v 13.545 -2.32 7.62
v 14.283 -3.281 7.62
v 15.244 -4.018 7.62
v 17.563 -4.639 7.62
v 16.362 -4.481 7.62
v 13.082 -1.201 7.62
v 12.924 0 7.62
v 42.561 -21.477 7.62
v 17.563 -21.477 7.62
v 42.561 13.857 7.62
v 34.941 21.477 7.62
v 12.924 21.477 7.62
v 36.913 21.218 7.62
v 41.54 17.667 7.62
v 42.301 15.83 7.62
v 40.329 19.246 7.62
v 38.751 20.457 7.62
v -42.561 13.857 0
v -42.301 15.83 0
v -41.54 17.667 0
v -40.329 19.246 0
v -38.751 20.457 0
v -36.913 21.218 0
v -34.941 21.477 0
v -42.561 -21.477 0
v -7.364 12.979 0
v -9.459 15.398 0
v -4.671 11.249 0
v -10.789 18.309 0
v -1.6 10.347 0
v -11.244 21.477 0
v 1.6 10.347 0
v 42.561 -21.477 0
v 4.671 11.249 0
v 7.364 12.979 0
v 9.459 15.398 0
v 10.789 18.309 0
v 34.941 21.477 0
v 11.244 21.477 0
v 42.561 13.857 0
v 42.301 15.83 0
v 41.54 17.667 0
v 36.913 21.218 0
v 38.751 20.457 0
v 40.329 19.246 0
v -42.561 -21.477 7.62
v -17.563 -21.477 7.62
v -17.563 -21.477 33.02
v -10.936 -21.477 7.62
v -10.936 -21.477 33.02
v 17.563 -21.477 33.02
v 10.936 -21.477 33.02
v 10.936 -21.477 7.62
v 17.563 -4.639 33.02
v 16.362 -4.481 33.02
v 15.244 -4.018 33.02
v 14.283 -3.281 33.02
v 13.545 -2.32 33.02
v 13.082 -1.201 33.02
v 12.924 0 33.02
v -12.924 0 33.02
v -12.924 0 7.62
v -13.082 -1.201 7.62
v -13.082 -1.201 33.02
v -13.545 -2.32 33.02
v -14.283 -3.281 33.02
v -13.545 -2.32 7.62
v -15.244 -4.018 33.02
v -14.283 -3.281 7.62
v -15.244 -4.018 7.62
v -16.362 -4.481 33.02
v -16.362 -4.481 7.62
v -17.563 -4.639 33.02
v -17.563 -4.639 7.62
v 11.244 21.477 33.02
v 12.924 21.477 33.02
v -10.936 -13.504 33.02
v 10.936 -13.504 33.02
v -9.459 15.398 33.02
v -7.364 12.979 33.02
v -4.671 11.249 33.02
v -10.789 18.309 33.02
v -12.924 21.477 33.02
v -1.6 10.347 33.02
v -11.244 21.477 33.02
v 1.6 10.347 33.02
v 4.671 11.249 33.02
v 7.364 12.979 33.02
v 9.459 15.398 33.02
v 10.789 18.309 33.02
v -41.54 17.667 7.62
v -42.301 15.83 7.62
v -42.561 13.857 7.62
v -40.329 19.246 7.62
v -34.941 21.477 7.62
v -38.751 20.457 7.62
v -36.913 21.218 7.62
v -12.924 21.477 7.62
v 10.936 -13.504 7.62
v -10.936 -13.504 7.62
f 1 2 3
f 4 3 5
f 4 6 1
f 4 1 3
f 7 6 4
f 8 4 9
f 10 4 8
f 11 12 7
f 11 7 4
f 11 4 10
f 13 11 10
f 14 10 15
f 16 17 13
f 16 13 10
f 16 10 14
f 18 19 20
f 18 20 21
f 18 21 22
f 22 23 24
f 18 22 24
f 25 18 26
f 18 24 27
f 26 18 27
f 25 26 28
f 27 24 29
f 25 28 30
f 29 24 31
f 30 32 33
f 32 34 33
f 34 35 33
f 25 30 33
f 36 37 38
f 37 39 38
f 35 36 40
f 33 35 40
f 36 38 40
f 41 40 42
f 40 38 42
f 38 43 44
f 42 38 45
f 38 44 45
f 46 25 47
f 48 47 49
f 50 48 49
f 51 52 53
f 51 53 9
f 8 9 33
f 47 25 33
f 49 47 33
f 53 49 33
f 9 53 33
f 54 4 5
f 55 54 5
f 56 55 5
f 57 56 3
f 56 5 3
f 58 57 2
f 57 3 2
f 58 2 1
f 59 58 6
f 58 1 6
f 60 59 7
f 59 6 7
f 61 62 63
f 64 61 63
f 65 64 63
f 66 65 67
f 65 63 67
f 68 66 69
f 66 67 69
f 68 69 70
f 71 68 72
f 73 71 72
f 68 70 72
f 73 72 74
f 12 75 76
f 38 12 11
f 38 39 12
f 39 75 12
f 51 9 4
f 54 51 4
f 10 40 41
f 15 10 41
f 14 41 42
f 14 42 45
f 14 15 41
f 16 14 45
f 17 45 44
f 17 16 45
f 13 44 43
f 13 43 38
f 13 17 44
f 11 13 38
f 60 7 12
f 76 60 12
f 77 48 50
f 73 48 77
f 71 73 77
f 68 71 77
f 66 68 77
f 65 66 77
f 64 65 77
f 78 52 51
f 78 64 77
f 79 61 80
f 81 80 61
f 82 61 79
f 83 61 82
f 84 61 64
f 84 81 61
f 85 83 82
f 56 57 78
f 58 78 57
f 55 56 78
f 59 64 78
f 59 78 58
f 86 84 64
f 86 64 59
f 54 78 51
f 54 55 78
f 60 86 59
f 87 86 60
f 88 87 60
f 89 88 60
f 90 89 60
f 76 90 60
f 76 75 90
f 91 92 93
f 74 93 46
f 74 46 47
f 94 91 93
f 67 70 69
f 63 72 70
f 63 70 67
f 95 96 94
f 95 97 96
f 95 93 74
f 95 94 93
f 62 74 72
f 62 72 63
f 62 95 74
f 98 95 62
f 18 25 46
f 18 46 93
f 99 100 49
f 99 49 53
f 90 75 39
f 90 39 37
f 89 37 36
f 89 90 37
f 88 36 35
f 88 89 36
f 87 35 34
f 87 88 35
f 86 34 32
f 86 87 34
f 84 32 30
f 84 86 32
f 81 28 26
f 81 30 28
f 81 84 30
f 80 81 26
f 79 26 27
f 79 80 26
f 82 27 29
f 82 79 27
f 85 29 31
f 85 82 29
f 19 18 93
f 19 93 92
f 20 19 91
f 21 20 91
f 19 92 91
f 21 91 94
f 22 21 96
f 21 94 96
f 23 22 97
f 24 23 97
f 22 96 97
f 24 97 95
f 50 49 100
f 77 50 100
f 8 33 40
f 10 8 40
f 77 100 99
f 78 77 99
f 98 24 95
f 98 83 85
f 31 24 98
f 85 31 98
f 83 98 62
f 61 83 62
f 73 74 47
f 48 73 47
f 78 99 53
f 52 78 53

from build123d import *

# Parameters (mm, degrees)
F0_W     = 85.1215273142
F0_H     = 42.9548472166
F1_DEPTH = 7.62
F2_R     = 7.62
F4_DEPTH = 25.4
F5_DEPTH = 25.4


with BuildPart() as f1:
    # F0 (on Top) → F1 (new body)
    with BuildSketch(Plane.XY):
        Rectangle(F0_W, F0_H)
    extrude(amount=F1_DEPTH)

    # F2
    f2_edges = [f1.edges().sort_by_distance(p)[0] for p in [
        (-42.560764, 21.477424, 3.81),
        (42.560764, 21.477424, 3.81),
    ]]
    fillet(f2_edges, radius=F2_R)

    # F3 (on face) → F4 (join)
    with BuildSketch(Plane.XY.offset(7.62)):
        with BuildLine():
            Line((12.9238776863, 21.4774236083), (11.2444977121, 21.4774236083))
            ThreePointArc((11.2444977121, 21.4774236083), (0, 10.2329258962), (-11.2444977121, 21.4774236083))
            Line((-11.2444977121, 21.4774236083), (-12.9238776863, 21.4774236083))
            Line((-12.9238776863, 21.4774236083), (-12.9238776863, 0))
            ThreePointArc((-12.9238776863, 0), (-14.282709623, -3.2805104906), (-17.5632201135, -4.6393424273))
            Line((-17.5632201135, -4.6393424273), (-17.5632201135, -21.4774236083))
            Line((-17.5632201135, -21.4774236083), (-10.9355887398, -21.4774236083))
            Line((-10.9355887398, -21.4774236083), (-10.9355887398, -13.5037954897))
            Line((-10.9355887398, -13.5037954897), (-3.6451956257, -13.5037954897))
            Line((-3.6451956257, -13.5037954897), (3.6451956257, -13.5037954897))
            Line((3.6451956257, -13.5037954897), (10.9355887398, -13.5037954897))
            Line((10.9355887398, -13.5037954897), (10.9355887398, -21.4774236083))
            Line((10.9355887398, -21.4774236083), (17.5632201135, -21.4774236083))
            Line((17.5632201135, -21.4774236083), (17.5632201135, -4.6393424273))
            ThreePointArc((17.5632201135, -4.6393424273), (14.282709623, -3.2805104906), (12.9238776863, 0))
            Line((12.9238776863, 0), (12.9238776863, 21.4774236083))
        make_face()
    extrude(amount=F4_DEPTH)

    # F5 (cut): a face of the model
    f5_faces = [f1.faces().sort_by_distance(p)[0] for p in [
        (0, 16.7051105591, 7.62),
    ]]
    extrude(f5_faces, amount=-F5_DEPTH, mode=Mode.SUBTRACT)


solid = f1.part
